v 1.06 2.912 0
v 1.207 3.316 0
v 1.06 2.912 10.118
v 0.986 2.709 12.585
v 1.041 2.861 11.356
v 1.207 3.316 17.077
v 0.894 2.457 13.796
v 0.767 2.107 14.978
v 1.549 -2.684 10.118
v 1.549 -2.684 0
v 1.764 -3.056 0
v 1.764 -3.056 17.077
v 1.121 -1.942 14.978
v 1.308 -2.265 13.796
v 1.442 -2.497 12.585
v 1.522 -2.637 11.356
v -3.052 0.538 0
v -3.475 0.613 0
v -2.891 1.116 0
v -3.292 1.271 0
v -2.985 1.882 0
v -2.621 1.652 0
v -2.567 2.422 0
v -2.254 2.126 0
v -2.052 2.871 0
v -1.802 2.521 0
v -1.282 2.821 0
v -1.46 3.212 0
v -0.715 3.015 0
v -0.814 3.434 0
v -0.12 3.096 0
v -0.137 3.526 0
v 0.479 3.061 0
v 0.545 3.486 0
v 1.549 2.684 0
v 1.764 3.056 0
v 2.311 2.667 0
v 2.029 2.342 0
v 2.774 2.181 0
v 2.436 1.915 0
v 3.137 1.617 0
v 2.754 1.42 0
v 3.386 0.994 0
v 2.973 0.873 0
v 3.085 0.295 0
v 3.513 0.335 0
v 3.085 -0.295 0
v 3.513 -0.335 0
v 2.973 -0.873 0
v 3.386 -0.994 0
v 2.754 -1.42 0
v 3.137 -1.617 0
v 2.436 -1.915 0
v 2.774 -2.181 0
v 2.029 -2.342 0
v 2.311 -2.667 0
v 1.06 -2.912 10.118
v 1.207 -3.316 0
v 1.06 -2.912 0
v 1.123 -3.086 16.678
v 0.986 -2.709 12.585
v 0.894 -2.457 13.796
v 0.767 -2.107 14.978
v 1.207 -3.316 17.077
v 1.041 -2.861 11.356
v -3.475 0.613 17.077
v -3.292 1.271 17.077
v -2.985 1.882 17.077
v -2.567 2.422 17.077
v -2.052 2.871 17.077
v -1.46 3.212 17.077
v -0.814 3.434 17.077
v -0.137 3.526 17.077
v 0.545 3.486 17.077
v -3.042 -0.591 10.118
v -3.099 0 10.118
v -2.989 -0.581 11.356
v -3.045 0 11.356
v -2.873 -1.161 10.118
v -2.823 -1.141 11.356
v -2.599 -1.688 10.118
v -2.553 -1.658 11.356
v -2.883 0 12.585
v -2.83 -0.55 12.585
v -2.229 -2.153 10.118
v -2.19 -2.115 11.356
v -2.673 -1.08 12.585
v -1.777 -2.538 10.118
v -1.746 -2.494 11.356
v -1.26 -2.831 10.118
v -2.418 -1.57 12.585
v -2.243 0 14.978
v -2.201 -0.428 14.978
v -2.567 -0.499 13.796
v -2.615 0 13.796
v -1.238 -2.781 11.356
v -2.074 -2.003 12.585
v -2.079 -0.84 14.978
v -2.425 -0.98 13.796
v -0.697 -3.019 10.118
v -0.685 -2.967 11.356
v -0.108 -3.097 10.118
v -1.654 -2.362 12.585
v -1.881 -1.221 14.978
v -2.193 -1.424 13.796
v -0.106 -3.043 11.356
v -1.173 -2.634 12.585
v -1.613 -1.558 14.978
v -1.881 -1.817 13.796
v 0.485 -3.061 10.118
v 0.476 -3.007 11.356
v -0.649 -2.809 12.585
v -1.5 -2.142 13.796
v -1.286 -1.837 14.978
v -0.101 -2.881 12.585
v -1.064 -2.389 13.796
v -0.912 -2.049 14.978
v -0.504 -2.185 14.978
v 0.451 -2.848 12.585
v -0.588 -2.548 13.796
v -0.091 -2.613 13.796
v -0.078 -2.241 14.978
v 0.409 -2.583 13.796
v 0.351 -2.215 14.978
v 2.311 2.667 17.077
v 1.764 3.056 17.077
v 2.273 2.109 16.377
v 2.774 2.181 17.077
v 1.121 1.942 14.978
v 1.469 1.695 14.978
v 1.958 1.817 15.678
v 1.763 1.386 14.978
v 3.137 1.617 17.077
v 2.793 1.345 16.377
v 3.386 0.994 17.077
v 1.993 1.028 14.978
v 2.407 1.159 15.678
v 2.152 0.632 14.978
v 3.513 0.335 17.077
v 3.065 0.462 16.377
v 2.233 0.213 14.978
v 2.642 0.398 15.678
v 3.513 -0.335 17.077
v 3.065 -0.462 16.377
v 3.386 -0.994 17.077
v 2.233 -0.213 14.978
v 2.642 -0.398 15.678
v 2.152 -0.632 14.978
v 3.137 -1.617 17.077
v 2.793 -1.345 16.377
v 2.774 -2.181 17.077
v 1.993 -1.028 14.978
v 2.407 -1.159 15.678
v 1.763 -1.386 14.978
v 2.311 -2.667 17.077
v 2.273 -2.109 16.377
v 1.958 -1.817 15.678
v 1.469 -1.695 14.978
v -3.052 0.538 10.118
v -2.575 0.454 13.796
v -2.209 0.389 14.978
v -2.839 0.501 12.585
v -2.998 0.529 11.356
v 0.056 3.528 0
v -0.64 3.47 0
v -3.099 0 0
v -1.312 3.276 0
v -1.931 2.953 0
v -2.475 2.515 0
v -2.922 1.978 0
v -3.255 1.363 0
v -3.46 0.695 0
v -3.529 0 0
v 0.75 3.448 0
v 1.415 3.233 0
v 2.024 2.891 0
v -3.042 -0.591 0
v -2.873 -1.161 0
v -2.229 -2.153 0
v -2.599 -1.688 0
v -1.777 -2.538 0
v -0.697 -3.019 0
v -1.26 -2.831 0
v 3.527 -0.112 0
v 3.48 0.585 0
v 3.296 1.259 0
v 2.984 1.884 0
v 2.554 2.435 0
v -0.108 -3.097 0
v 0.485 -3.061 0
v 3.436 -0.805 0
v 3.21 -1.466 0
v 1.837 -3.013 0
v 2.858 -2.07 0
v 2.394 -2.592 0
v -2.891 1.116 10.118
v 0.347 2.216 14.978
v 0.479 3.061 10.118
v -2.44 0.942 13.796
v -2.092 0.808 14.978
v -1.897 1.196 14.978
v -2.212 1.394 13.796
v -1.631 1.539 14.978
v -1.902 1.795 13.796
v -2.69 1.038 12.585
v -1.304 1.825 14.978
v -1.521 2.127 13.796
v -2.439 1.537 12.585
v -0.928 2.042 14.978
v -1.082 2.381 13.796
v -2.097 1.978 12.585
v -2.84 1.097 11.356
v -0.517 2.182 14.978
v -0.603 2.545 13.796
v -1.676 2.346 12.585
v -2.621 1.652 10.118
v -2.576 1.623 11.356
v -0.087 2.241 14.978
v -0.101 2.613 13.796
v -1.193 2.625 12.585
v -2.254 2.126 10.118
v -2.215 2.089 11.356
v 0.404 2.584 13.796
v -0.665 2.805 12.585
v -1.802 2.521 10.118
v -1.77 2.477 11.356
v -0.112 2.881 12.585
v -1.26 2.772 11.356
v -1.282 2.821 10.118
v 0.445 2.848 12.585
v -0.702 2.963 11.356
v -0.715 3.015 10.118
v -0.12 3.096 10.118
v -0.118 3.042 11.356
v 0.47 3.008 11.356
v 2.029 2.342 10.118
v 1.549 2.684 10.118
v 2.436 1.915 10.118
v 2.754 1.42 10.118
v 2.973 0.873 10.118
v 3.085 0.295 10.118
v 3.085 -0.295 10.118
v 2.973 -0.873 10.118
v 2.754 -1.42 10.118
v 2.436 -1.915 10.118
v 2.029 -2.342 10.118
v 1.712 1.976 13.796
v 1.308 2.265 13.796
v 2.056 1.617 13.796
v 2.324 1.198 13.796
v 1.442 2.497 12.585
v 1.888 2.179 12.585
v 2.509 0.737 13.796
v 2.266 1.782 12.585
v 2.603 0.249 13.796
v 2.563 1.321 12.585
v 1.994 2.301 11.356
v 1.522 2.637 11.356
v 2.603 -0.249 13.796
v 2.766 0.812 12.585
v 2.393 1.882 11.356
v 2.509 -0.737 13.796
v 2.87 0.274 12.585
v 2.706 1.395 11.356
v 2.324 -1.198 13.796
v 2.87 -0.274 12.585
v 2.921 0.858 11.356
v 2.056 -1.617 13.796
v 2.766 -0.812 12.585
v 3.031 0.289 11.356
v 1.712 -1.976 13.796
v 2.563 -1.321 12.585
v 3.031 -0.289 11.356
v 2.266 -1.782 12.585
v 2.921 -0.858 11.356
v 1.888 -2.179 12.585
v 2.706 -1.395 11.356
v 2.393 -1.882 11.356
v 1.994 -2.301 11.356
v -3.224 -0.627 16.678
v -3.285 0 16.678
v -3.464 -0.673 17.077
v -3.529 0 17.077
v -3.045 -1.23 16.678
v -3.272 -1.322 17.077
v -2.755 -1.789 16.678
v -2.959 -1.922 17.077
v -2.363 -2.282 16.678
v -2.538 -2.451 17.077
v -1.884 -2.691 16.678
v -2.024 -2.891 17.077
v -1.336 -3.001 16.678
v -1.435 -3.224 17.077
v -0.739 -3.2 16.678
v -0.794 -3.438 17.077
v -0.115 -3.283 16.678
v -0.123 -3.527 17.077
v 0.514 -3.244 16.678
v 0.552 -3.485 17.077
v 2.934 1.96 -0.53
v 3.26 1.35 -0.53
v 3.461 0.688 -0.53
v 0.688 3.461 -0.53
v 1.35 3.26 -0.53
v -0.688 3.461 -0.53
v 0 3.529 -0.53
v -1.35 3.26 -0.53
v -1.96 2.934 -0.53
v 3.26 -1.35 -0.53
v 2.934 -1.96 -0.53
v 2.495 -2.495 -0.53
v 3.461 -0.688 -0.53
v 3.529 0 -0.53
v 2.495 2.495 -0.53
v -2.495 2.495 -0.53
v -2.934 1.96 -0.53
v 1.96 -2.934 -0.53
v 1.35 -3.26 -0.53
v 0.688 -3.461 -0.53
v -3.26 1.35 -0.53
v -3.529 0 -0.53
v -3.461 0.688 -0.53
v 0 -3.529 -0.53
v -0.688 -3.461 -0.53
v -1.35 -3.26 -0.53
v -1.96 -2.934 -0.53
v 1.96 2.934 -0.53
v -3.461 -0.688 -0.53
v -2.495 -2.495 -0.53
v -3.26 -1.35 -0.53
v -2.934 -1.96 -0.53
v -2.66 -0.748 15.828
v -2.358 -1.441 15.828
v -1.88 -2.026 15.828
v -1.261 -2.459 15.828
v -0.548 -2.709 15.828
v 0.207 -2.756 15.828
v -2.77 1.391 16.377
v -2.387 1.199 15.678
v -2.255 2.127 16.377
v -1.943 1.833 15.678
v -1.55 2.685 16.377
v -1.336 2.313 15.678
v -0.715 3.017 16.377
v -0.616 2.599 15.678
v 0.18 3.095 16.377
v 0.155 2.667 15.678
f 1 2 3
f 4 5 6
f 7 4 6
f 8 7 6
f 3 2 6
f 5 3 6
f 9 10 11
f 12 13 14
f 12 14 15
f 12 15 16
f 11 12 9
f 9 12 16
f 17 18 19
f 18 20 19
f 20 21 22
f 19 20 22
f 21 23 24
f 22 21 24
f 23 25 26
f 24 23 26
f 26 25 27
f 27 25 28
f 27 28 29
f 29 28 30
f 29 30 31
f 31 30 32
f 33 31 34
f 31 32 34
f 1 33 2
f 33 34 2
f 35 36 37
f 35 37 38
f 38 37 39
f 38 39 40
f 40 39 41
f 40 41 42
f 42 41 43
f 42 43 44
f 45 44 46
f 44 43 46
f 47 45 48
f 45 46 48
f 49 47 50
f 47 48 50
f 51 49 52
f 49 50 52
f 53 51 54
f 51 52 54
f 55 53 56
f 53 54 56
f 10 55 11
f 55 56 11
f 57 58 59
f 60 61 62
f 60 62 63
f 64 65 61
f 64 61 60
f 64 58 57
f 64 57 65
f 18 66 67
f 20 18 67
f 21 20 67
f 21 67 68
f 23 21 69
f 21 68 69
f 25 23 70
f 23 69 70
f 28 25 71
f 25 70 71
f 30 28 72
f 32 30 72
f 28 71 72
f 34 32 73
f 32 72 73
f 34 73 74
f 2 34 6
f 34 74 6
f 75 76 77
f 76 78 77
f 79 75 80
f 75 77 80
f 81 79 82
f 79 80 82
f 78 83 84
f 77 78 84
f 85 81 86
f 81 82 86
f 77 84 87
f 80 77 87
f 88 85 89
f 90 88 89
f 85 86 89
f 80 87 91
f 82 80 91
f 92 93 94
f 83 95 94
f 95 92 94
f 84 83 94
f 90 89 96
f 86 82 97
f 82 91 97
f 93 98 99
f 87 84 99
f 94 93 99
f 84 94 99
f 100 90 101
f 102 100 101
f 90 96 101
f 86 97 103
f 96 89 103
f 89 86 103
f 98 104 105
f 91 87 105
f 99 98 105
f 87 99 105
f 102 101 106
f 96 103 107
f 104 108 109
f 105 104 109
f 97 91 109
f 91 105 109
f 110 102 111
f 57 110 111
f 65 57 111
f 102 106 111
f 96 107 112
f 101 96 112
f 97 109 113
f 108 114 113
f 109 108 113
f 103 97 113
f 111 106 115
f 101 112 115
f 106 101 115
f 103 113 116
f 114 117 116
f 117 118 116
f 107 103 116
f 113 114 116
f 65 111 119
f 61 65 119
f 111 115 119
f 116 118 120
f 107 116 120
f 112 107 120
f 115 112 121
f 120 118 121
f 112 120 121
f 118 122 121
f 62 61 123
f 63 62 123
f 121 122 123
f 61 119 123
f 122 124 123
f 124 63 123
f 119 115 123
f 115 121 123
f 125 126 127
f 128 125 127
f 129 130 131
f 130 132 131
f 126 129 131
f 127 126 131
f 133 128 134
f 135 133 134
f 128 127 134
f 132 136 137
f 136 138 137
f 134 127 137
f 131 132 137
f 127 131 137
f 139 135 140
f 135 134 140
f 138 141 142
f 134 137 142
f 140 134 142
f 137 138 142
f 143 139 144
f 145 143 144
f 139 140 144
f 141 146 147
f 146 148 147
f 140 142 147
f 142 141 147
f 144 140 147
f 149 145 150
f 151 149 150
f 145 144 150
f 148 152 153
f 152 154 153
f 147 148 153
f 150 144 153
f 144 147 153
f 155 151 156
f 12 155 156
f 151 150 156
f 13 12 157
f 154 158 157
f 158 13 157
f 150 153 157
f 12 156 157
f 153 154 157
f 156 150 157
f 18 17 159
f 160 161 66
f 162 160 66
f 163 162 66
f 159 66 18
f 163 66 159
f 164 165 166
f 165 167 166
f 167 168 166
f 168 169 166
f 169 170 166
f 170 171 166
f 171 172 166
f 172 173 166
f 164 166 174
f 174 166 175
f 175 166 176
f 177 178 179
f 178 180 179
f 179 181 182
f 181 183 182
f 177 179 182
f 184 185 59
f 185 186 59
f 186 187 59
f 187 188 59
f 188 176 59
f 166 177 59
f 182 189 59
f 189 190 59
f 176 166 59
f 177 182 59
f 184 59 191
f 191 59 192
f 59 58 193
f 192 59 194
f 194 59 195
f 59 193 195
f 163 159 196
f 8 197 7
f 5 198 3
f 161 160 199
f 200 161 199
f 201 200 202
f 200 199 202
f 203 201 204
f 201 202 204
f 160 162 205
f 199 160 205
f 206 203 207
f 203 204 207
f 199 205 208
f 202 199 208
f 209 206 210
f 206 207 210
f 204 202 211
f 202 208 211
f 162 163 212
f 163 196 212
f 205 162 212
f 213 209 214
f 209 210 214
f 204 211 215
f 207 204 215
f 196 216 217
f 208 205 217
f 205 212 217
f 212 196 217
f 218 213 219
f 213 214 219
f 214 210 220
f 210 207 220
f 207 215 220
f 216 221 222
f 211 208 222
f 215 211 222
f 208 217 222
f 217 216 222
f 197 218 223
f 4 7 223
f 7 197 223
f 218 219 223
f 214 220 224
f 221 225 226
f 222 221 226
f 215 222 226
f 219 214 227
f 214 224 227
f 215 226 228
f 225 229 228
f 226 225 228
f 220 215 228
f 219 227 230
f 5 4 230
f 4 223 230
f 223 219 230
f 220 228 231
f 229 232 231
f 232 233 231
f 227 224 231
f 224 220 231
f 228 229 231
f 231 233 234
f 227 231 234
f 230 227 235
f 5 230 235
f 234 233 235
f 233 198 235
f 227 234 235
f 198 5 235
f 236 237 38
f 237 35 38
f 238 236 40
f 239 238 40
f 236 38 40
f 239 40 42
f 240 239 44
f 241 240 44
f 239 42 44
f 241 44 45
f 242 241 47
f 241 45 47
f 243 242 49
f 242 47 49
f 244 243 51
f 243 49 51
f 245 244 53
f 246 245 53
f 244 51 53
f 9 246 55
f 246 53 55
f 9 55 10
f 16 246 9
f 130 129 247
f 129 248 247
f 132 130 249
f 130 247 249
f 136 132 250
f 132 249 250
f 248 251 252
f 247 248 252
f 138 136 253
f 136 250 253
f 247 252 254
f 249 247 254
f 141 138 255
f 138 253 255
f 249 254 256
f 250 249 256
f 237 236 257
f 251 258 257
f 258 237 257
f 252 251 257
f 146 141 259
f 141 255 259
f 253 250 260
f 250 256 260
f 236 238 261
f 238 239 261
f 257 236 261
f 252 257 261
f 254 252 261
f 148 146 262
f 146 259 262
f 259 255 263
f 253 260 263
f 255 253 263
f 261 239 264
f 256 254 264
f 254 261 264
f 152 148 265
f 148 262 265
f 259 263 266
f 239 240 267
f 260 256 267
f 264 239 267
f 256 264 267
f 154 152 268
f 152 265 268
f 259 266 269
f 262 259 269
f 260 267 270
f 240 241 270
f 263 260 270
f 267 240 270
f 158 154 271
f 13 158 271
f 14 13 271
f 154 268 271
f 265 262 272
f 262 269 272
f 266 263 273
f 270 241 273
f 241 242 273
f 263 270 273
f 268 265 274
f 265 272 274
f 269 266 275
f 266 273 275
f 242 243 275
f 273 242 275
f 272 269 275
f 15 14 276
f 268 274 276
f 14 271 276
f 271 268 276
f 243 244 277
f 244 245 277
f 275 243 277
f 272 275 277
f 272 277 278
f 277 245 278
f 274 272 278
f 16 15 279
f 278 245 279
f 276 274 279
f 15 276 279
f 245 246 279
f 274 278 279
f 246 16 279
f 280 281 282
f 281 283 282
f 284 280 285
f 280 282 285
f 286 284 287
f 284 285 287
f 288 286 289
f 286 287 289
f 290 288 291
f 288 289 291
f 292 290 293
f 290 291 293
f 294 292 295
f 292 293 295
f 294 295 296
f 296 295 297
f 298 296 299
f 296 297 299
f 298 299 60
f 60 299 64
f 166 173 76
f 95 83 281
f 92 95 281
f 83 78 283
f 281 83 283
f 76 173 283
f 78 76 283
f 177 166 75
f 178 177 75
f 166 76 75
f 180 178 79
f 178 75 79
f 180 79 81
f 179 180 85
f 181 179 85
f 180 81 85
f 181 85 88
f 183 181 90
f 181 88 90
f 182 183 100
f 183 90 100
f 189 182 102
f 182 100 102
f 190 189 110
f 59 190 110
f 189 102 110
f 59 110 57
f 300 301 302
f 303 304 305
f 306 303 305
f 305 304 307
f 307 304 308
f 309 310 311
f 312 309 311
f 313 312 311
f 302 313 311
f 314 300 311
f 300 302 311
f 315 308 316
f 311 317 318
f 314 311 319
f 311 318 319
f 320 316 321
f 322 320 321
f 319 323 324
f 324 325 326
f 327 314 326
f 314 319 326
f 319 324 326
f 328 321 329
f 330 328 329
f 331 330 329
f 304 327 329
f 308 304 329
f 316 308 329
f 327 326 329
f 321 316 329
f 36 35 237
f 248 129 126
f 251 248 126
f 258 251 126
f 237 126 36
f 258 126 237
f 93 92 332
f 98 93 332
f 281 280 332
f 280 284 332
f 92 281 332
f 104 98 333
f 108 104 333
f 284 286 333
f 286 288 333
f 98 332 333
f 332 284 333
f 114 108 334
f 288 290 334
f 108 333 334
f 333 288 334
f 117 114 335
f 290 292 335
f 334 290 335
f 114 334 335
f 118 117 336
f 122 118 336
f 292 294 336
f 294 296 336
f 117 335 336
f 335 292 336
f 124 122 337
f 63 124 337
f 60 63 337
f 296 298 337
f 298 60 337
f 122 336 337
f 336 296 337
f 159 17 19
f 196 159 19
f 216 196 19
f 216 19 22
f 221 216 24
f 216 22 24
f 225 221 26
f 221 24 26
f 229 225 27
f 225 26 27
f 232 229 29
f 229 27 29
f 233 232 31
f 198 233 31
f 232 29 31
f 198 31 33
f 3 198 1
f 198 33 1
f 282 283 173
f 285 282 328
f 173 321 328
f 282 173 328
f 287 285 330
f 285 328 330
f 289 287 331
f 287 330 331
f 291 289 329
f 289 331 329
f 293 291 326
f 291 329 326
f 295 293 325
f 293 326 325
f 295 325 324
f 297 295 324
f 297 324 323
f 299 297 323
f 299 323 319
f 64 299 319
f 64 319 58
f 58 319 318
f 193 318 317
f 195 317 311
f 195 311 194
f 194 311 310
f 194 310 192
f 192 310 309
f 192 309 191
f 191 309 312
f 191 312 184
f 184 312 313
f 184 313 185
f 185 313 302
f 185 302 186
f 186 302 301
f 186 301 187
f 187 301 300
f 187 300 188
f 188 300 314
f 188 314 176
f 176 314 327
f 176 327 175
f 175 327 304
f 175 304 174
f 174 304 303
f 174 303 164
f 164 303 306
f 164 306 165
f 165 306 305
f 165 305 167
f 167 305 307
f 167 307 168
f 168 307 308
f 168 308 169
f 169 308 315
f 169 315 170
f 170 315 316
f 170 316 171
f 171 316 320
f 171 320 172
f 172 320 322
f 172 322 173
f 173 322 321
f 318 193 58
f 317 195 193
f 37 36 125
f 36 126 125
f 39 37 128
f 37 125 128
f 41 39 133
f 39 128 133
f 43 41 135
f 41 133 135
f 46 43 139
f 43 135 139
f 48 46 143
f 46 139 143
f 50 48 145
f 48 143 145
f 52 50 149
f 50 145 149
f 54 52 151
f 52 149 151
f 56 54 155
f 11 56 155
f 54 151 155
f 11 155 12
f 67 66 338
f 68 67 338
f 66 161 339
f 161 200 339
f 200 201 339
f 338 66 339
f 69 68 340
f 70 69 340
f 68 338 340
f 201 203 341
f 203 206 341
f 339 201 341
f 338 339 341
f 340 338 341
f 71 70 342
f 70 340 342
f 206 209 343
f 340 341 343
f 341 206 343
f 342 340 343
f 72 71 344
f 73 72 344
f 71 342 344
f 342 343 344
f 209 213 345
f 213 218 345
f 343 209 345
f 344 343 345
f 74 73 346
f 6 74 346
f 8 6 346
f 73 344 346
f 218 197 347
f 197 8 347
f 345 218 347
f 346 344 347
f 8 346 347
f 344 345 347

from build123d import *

# Parameters (mm, degrees)
F1_ANGLE = 10
F2_ANGLE = 110
F3_ANGLE = 10
F4_ANGLE = 120
F5_ANGLE = 10
F6_ANGLE = 10
F8_ANGLE = 110


with BuildPart() as f1:
    # F0 (on Front) → F1 (revolve)
    with BuildSketch(Plane.XZ):
        with BuildLine():
            Line((-3.5287903258, 17.0769609176), (-3.5287903258, 0))
            Line((-3.5287903258, 0), (-3.0986794736, 0))
            Line((-3.0986794736, 0), (-3.0986794736, 10.1178176701))
            ThreePointArc((-3.0986794736, 10.1178176701), (-2.8830391202, 12.5854312412), (-2.2426552605, 14.9782383814))
            Line((-2.2426552605, 14.9782383814), (-3.2845714595, 16.6784431785))
            Line((-3.2845714595, 16.6784431785), (-3.5287903258, 17.0769609176))
        make_face()
    revolve(axis=Axis((0, 0, -0.2650460228), (0, 0, -1)), revolution_arc=F1_ANGLE)

    # F2_face1 (on face) → F5 (revolve, cut)
    with BuildSketch(Plane(origin=(-3.1631235967, 0.5577440334, 9.6345378816), x_dir=(0.984807753, -0.1736481777, 0), z_dir=(-0.1736481777, -0.984807753, 0))):
        with BuildLine():
            Line((0.9692646163, 5.3437004999), (-0.316870449, 7.442423036))
            Line((-0.316870449, 7.442423036), (-0.316870449, -9.6345378816))
            Line((-0.316870449, -9.6345378816), (0.1132404032, -9.6345378816))
            Line((0.1132404032, -9.6345378816), (0.1132404032, 0.4832797885))
            ThreePointArc((0.1132404032, 0.4832797885), (0.3288807566, 2.9508933596), (0.9692646163, 5.3437004999))
        make_face()
    revolve(axis=Axis((0, 0, -0.2650460228), (0, 0, 1)), revolution_arc=F5_ANGLE, mode=Mode.SUBTRACT)


with BuildPart() as f2:
    # F1_face (on face) → F2 (revolve)
    with BuildSketch(Plane(origin=(-3.1631235967, 0.5577440334, 9.6345378816), x_dir=(-0.984807753, 0.1736481777, 0), z_dir=(0.1736481777, 0.984807753, 0))):
        with BuildLine():
            Line((0.316870449, 7.442423036), (-0.9692646163, 5.3437004999))
            ThreePointArc((-0.9692646163, 5.3437004999), (-0.3288807566, 2.9508933596), (-0.1132404032, 0.4832797885))
            Line((-0.1132404032, 0.4832797885), (-0.1132404032, -9.6345378816))
            Line((-0.1132404032, -9.6345378816), (0.316870449, -9.6345378816))
            Line((0.316870449, -9.6345378816), (0.316870449, 7.442423036))
        make_face()
    revolve(axis=Axis((0, 0, -0.2650460228), (0, 0, -1)), revolution_arc=F2_ANGLE)


with BuildPart() as f3:
    # F2_face (on face) → F3 (revolve)
    with BuildSketch(Plane(origin=(1.6059599384, 2.7816042082, 9.6345378816), x_dir=(0.5, 0.8660254038, 0), z_dir=(0.8660254038, -0.5, 0))):
        with BuildLine():
            Line((0.316870449, 7.442423036), (-0.9692646163, 5.3437004999))
            ThreePointArc((-0.9692646163, 5.3437004999), (-0.3288807566, 2.9508933596), (-0.1132404032, 0.4832797885))
            Line((-0.1132404032, 0.4832797885), (-0.1132404032, -9.6345378816))
            Line((-0.1132404032, -9.6345378816), (0.316870449, -9.6345378816))
            Line((0.316870449, -9.6345378816), (0.316870449, 7.442423036))
        make_face()
    revolve(axis=Axis((0, 0, -0.2650460228), (0, 0, 1)), revolution_arc=F3_ANGLE)


with BuildPart() as f4:
    # F2_face (on face) → F4 (revolve)
    with BuildSketch(Plane(origin=(1.6059599384, 2.7816042082, 9.6345378816), x_dir=(0.5, 0.8660254038, 0), z_dir=(0.8660254038, -0.5, 0))):
        with BuildLine():
            Line((0.316870449, 7.442423036), (-0.9692646163, 5.3437004999))
            ThreePointArc((-0.9692646163, 5.3437004999), (-0.3288807566, 2.9508933596), (-0.1132404032, 0.4832797885))
            Line((-0.1132404032, 0.4832797885), (-0.1132404032, -9.6345378816))
            Line((-0.1132404032, -9.6345378816), (0.316870449, -9.6345378816))
            Line((0.316870449, -9.6345378816), (0.316870449, 7.442423036))
        make_face()
    revolve(axis=Axis((0, 0, -0.2650460228), (0, 0, -1)), revolution_arc=F4_ANGLE)


with BuildPart() as f6_tool:
    # F4_face (on face) → F6 (revolve)
    with BuildSketch(Plane(origin=(1.6059599384, 2.7816042082, 9.6345378816), x_dir=(-0.5, -0.8660254038, 0), z_dir=(-0.8660254038, 0.5, 0))):
        with BuildLine():
            Line((0.9692646163, 5.3437004999), (-0.316870449, 7.442423036))
            Line((-0.316870449, 7.442423036), (-0.316870449, -9.6345378816))
            Line((-0.316870449, -9.6345378816), (0.1132404032, -9.6345378816))
            Line((0.1132404032, -9.6345378816), (0.1132404032, 0.4832797885))
            ThreePointArc((0.1132404032, 0.4832797885), (0.3288807566, 2.9508933596), (0.9692646163, 5.3437004999))
        make_face()
    revolve(axis=Axis((0, 0, -0.2650460228), (0, 0, 1)), revolution_arc=F6_ANGLE)


with BuildPart() as f2_1:
    add(f2.part)

    # F6: cut by f6_tool
    add(f6_tool.part, mode=Mode.SUBTRACT)


with BuildPart() as f3_1:
    add(f3.part)

    # F6: cut by f6_tool
    add(f6_tool.part, mode=Mode.SUBTRACT)


with BuildPart() as f7:
    # F0 (on Front) → F7 (revolve)
    with BuildSketch(Plane.XZ):
        Polygon((-3.5287903258, -0.5300920457), (-3.2845714595, -0.5300920457), (0, -0.5300920457), (0, 0), (-3.0986794736, 0), (-3.5287903258, 0), align=None)
    revolve(axis=Axis((0, 0, -0.2650460228), (0, 0, 1)))

    # F0 (on Front) → F8 (revolve)
    with BuildSketch(Plane.XZ):
        with BuildLine():
            Line((-3.5287903258, 17.0769609176), (-3.5287903258, 0))
            Line((-3.5287903258, 0), (-3.0986794736, 0))
            Line((-3.0986794736, 0), (-3.0986794736, 10.1178176701))
            ThreePointArc((-3.0986794736, 10.1178176701), (-2.8830391202, 12.5854312412), (-2.2426552605, 14.9782383814))
            Line((-2.2426552605, 14.9782383814), (-3.2845714595, 16.6784431785))
            Line((-3.2845714595, 16.6784431785), (-3.5287903258, 17.0769609176))
        make_face()
    revolve(axis=Axis((0, 0, -0.2650460228), (0, 0, 1)), revolution_arc=F8_ANGLE)


solid = Compound([f4.part, f2_1.part, f7.part])
